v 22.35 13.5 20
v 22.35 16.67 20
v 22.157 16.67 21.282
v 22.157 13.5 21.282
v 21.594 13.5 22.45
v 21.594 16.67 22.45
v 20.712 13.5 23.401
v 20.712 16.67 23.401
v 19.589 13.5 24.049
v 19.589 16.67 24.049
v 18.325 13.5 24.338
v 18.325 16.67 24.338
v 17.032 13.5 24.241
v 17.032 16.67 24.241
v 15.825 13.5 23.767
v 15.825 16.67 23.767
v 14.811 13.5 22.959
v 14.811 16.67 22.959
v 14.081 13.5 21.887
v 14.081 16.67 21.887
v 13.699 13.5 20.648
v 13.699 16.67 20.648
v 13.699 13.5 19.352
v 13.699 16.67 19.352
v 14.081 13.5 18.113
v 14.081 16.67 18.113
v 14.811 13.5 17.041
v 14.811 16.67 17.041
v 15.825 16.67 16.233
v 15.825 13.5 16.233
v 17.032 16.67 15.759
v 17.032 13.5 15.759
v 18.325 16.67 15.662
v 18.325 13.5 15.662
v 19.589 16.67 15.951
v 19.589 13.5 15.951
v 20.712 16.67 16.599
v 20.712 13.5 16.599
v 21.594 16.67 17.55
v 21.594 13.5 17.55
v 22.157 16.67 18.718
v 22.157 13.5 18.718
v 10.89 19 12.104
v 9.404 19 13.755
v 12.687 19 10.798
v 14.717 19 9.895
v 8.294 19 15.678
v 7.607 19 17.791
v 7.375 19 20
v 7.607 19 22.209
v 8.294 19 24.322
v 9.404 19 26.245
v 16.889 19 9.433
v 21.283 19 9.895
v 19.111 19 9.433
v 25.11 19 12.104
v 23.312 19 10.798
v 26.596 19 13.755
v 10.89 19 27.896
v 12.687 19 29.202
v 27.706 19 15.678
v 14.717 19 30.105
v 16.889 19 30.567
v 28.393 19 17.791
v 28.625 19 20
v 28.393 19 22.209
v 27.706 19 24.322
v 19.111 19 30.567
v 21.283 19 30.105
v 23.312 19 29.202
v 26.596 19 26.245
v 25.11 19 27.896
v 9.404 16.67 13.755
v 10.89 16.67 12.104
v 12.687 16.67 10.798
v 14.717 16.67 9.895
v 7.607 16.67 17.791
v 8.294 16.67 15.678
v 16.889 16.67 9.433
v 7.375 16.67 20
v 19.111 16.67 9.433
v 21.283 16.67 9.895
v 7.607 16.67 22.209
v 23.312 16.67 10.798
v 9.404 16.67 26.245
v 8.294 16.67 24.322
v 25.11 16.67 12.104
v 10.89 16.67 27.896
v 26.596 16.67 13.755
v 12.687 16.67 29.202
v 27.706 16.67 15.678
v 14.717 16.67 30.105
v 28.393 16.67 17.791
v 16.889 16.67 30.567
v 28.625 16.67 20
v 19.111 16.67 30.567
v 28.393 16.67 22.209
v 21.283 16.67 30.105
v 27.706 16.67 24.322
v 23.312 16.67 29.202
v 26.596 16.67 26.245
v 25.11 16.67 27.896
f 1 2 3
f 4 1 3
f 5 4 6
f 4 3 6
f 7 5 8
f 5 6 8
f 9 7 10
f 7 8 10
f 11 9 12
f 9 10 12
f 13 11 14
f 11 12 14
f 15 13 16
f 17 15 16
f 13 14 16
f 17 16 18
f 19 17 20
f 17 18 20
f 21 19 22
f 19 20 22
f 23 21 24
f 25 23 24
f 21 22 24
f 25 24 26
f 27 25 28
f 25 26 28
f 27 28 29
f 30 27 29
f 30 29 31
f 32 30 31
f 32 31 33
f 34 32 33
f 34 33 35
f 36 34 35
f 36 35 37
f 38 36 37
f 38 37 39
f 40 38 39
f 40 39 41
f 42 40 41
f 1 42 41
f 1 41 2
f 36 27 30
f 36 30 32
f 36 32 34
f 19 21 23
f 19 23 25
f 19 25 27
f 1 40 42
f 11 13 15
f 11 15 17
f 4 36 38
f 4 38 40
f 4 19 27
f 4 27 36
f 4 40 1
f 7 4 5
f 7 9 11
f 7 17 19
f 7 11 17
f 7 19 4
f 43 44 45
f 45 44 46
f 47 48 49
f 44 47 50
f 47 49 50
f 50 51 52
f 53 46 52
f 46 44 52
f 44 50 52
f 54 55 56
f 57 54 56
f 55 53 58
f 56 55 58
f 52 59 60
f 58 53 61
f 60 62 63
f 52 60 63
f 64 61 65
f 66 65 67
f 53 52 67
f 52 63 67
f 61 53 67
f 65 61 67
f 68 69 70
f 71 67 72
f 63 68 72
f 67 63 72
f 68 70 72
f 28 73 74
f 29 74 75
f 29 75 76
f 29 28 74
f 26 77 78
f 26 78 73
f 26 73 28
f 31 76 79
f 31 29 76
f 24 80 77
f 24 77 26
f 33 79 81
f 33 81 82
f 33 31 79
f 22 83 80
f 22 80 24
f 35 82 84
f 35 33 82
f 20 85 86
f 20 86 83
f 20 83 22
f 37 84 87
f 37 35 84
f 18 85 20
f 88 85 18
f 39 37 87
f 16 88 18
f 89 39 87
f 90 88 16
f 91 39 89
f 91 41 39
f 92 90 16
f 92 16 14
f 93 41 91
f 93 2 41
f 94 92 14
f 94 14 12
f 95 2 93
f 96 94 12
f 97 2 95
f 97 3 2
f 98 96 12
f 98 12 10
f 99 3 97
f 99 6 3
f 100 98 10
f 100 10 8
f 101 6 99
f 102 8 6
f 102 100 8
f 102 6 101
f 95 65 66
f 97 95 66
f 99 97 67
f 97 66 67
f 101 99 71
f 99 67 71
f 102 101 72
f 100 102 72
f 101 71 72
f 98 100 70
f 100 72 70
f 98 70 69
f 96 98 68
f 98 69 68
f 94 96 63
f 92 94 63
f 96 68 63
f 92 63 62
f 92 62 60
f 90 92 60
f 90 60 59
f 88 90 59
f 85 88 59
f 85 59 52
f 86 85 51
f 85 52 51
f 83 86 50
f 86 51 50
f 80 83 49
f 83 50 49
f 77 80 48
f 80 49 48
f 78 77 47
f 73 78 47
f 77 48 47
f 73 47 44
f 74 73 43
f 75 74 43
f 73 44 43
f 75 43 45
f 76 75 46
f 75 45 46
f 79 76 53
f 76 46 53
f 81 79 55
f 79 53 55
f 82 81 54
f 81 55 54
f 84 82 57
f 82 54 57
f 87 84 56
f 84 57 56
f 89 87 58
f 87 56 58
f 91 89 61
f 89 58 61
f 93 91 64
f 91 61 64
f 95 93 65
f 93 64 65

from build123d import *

# Parameters (mm, degrees)
CYLINDER009_R             = 4.35
CYLINDER009_DEPTH         = 5.5
CYLINDER008_R             = 10.625
CYLINDER008_DEPTH         = 2.33
FUSION002_PLACEMENT_ANGLE = 90


with BuildPart() as servoplate002:
    # Cylinder009 → Cylinder009 (new body)
    with BuildSketch(Plane.XY):
        Circle(CYLINDER009_R)
    extrude(amount=CYLINDER009_DEPTH)


with BuildPart() as servoplate003:
    # Cylinder008 → Cylinder008 (new body)
    with BuildSketch(Plane.XY):
        Circle(CYLINDER008_R)
    extrude(amount=CYLINDER008_DEPTH)

    # Fusion002: union servoPlate002
    add(servoplate002.part)


with BuildPart() as servoplate003_1:
    # Fusion002 placement: moved
    add(servoplate003.part.moved(Location((18, 19, 20))).rotate(Axis((18, 19, 20), (1, 0, 0)), FUSION002_PLACEMENT_ANGLE))


solid = servoplate003_1.part
